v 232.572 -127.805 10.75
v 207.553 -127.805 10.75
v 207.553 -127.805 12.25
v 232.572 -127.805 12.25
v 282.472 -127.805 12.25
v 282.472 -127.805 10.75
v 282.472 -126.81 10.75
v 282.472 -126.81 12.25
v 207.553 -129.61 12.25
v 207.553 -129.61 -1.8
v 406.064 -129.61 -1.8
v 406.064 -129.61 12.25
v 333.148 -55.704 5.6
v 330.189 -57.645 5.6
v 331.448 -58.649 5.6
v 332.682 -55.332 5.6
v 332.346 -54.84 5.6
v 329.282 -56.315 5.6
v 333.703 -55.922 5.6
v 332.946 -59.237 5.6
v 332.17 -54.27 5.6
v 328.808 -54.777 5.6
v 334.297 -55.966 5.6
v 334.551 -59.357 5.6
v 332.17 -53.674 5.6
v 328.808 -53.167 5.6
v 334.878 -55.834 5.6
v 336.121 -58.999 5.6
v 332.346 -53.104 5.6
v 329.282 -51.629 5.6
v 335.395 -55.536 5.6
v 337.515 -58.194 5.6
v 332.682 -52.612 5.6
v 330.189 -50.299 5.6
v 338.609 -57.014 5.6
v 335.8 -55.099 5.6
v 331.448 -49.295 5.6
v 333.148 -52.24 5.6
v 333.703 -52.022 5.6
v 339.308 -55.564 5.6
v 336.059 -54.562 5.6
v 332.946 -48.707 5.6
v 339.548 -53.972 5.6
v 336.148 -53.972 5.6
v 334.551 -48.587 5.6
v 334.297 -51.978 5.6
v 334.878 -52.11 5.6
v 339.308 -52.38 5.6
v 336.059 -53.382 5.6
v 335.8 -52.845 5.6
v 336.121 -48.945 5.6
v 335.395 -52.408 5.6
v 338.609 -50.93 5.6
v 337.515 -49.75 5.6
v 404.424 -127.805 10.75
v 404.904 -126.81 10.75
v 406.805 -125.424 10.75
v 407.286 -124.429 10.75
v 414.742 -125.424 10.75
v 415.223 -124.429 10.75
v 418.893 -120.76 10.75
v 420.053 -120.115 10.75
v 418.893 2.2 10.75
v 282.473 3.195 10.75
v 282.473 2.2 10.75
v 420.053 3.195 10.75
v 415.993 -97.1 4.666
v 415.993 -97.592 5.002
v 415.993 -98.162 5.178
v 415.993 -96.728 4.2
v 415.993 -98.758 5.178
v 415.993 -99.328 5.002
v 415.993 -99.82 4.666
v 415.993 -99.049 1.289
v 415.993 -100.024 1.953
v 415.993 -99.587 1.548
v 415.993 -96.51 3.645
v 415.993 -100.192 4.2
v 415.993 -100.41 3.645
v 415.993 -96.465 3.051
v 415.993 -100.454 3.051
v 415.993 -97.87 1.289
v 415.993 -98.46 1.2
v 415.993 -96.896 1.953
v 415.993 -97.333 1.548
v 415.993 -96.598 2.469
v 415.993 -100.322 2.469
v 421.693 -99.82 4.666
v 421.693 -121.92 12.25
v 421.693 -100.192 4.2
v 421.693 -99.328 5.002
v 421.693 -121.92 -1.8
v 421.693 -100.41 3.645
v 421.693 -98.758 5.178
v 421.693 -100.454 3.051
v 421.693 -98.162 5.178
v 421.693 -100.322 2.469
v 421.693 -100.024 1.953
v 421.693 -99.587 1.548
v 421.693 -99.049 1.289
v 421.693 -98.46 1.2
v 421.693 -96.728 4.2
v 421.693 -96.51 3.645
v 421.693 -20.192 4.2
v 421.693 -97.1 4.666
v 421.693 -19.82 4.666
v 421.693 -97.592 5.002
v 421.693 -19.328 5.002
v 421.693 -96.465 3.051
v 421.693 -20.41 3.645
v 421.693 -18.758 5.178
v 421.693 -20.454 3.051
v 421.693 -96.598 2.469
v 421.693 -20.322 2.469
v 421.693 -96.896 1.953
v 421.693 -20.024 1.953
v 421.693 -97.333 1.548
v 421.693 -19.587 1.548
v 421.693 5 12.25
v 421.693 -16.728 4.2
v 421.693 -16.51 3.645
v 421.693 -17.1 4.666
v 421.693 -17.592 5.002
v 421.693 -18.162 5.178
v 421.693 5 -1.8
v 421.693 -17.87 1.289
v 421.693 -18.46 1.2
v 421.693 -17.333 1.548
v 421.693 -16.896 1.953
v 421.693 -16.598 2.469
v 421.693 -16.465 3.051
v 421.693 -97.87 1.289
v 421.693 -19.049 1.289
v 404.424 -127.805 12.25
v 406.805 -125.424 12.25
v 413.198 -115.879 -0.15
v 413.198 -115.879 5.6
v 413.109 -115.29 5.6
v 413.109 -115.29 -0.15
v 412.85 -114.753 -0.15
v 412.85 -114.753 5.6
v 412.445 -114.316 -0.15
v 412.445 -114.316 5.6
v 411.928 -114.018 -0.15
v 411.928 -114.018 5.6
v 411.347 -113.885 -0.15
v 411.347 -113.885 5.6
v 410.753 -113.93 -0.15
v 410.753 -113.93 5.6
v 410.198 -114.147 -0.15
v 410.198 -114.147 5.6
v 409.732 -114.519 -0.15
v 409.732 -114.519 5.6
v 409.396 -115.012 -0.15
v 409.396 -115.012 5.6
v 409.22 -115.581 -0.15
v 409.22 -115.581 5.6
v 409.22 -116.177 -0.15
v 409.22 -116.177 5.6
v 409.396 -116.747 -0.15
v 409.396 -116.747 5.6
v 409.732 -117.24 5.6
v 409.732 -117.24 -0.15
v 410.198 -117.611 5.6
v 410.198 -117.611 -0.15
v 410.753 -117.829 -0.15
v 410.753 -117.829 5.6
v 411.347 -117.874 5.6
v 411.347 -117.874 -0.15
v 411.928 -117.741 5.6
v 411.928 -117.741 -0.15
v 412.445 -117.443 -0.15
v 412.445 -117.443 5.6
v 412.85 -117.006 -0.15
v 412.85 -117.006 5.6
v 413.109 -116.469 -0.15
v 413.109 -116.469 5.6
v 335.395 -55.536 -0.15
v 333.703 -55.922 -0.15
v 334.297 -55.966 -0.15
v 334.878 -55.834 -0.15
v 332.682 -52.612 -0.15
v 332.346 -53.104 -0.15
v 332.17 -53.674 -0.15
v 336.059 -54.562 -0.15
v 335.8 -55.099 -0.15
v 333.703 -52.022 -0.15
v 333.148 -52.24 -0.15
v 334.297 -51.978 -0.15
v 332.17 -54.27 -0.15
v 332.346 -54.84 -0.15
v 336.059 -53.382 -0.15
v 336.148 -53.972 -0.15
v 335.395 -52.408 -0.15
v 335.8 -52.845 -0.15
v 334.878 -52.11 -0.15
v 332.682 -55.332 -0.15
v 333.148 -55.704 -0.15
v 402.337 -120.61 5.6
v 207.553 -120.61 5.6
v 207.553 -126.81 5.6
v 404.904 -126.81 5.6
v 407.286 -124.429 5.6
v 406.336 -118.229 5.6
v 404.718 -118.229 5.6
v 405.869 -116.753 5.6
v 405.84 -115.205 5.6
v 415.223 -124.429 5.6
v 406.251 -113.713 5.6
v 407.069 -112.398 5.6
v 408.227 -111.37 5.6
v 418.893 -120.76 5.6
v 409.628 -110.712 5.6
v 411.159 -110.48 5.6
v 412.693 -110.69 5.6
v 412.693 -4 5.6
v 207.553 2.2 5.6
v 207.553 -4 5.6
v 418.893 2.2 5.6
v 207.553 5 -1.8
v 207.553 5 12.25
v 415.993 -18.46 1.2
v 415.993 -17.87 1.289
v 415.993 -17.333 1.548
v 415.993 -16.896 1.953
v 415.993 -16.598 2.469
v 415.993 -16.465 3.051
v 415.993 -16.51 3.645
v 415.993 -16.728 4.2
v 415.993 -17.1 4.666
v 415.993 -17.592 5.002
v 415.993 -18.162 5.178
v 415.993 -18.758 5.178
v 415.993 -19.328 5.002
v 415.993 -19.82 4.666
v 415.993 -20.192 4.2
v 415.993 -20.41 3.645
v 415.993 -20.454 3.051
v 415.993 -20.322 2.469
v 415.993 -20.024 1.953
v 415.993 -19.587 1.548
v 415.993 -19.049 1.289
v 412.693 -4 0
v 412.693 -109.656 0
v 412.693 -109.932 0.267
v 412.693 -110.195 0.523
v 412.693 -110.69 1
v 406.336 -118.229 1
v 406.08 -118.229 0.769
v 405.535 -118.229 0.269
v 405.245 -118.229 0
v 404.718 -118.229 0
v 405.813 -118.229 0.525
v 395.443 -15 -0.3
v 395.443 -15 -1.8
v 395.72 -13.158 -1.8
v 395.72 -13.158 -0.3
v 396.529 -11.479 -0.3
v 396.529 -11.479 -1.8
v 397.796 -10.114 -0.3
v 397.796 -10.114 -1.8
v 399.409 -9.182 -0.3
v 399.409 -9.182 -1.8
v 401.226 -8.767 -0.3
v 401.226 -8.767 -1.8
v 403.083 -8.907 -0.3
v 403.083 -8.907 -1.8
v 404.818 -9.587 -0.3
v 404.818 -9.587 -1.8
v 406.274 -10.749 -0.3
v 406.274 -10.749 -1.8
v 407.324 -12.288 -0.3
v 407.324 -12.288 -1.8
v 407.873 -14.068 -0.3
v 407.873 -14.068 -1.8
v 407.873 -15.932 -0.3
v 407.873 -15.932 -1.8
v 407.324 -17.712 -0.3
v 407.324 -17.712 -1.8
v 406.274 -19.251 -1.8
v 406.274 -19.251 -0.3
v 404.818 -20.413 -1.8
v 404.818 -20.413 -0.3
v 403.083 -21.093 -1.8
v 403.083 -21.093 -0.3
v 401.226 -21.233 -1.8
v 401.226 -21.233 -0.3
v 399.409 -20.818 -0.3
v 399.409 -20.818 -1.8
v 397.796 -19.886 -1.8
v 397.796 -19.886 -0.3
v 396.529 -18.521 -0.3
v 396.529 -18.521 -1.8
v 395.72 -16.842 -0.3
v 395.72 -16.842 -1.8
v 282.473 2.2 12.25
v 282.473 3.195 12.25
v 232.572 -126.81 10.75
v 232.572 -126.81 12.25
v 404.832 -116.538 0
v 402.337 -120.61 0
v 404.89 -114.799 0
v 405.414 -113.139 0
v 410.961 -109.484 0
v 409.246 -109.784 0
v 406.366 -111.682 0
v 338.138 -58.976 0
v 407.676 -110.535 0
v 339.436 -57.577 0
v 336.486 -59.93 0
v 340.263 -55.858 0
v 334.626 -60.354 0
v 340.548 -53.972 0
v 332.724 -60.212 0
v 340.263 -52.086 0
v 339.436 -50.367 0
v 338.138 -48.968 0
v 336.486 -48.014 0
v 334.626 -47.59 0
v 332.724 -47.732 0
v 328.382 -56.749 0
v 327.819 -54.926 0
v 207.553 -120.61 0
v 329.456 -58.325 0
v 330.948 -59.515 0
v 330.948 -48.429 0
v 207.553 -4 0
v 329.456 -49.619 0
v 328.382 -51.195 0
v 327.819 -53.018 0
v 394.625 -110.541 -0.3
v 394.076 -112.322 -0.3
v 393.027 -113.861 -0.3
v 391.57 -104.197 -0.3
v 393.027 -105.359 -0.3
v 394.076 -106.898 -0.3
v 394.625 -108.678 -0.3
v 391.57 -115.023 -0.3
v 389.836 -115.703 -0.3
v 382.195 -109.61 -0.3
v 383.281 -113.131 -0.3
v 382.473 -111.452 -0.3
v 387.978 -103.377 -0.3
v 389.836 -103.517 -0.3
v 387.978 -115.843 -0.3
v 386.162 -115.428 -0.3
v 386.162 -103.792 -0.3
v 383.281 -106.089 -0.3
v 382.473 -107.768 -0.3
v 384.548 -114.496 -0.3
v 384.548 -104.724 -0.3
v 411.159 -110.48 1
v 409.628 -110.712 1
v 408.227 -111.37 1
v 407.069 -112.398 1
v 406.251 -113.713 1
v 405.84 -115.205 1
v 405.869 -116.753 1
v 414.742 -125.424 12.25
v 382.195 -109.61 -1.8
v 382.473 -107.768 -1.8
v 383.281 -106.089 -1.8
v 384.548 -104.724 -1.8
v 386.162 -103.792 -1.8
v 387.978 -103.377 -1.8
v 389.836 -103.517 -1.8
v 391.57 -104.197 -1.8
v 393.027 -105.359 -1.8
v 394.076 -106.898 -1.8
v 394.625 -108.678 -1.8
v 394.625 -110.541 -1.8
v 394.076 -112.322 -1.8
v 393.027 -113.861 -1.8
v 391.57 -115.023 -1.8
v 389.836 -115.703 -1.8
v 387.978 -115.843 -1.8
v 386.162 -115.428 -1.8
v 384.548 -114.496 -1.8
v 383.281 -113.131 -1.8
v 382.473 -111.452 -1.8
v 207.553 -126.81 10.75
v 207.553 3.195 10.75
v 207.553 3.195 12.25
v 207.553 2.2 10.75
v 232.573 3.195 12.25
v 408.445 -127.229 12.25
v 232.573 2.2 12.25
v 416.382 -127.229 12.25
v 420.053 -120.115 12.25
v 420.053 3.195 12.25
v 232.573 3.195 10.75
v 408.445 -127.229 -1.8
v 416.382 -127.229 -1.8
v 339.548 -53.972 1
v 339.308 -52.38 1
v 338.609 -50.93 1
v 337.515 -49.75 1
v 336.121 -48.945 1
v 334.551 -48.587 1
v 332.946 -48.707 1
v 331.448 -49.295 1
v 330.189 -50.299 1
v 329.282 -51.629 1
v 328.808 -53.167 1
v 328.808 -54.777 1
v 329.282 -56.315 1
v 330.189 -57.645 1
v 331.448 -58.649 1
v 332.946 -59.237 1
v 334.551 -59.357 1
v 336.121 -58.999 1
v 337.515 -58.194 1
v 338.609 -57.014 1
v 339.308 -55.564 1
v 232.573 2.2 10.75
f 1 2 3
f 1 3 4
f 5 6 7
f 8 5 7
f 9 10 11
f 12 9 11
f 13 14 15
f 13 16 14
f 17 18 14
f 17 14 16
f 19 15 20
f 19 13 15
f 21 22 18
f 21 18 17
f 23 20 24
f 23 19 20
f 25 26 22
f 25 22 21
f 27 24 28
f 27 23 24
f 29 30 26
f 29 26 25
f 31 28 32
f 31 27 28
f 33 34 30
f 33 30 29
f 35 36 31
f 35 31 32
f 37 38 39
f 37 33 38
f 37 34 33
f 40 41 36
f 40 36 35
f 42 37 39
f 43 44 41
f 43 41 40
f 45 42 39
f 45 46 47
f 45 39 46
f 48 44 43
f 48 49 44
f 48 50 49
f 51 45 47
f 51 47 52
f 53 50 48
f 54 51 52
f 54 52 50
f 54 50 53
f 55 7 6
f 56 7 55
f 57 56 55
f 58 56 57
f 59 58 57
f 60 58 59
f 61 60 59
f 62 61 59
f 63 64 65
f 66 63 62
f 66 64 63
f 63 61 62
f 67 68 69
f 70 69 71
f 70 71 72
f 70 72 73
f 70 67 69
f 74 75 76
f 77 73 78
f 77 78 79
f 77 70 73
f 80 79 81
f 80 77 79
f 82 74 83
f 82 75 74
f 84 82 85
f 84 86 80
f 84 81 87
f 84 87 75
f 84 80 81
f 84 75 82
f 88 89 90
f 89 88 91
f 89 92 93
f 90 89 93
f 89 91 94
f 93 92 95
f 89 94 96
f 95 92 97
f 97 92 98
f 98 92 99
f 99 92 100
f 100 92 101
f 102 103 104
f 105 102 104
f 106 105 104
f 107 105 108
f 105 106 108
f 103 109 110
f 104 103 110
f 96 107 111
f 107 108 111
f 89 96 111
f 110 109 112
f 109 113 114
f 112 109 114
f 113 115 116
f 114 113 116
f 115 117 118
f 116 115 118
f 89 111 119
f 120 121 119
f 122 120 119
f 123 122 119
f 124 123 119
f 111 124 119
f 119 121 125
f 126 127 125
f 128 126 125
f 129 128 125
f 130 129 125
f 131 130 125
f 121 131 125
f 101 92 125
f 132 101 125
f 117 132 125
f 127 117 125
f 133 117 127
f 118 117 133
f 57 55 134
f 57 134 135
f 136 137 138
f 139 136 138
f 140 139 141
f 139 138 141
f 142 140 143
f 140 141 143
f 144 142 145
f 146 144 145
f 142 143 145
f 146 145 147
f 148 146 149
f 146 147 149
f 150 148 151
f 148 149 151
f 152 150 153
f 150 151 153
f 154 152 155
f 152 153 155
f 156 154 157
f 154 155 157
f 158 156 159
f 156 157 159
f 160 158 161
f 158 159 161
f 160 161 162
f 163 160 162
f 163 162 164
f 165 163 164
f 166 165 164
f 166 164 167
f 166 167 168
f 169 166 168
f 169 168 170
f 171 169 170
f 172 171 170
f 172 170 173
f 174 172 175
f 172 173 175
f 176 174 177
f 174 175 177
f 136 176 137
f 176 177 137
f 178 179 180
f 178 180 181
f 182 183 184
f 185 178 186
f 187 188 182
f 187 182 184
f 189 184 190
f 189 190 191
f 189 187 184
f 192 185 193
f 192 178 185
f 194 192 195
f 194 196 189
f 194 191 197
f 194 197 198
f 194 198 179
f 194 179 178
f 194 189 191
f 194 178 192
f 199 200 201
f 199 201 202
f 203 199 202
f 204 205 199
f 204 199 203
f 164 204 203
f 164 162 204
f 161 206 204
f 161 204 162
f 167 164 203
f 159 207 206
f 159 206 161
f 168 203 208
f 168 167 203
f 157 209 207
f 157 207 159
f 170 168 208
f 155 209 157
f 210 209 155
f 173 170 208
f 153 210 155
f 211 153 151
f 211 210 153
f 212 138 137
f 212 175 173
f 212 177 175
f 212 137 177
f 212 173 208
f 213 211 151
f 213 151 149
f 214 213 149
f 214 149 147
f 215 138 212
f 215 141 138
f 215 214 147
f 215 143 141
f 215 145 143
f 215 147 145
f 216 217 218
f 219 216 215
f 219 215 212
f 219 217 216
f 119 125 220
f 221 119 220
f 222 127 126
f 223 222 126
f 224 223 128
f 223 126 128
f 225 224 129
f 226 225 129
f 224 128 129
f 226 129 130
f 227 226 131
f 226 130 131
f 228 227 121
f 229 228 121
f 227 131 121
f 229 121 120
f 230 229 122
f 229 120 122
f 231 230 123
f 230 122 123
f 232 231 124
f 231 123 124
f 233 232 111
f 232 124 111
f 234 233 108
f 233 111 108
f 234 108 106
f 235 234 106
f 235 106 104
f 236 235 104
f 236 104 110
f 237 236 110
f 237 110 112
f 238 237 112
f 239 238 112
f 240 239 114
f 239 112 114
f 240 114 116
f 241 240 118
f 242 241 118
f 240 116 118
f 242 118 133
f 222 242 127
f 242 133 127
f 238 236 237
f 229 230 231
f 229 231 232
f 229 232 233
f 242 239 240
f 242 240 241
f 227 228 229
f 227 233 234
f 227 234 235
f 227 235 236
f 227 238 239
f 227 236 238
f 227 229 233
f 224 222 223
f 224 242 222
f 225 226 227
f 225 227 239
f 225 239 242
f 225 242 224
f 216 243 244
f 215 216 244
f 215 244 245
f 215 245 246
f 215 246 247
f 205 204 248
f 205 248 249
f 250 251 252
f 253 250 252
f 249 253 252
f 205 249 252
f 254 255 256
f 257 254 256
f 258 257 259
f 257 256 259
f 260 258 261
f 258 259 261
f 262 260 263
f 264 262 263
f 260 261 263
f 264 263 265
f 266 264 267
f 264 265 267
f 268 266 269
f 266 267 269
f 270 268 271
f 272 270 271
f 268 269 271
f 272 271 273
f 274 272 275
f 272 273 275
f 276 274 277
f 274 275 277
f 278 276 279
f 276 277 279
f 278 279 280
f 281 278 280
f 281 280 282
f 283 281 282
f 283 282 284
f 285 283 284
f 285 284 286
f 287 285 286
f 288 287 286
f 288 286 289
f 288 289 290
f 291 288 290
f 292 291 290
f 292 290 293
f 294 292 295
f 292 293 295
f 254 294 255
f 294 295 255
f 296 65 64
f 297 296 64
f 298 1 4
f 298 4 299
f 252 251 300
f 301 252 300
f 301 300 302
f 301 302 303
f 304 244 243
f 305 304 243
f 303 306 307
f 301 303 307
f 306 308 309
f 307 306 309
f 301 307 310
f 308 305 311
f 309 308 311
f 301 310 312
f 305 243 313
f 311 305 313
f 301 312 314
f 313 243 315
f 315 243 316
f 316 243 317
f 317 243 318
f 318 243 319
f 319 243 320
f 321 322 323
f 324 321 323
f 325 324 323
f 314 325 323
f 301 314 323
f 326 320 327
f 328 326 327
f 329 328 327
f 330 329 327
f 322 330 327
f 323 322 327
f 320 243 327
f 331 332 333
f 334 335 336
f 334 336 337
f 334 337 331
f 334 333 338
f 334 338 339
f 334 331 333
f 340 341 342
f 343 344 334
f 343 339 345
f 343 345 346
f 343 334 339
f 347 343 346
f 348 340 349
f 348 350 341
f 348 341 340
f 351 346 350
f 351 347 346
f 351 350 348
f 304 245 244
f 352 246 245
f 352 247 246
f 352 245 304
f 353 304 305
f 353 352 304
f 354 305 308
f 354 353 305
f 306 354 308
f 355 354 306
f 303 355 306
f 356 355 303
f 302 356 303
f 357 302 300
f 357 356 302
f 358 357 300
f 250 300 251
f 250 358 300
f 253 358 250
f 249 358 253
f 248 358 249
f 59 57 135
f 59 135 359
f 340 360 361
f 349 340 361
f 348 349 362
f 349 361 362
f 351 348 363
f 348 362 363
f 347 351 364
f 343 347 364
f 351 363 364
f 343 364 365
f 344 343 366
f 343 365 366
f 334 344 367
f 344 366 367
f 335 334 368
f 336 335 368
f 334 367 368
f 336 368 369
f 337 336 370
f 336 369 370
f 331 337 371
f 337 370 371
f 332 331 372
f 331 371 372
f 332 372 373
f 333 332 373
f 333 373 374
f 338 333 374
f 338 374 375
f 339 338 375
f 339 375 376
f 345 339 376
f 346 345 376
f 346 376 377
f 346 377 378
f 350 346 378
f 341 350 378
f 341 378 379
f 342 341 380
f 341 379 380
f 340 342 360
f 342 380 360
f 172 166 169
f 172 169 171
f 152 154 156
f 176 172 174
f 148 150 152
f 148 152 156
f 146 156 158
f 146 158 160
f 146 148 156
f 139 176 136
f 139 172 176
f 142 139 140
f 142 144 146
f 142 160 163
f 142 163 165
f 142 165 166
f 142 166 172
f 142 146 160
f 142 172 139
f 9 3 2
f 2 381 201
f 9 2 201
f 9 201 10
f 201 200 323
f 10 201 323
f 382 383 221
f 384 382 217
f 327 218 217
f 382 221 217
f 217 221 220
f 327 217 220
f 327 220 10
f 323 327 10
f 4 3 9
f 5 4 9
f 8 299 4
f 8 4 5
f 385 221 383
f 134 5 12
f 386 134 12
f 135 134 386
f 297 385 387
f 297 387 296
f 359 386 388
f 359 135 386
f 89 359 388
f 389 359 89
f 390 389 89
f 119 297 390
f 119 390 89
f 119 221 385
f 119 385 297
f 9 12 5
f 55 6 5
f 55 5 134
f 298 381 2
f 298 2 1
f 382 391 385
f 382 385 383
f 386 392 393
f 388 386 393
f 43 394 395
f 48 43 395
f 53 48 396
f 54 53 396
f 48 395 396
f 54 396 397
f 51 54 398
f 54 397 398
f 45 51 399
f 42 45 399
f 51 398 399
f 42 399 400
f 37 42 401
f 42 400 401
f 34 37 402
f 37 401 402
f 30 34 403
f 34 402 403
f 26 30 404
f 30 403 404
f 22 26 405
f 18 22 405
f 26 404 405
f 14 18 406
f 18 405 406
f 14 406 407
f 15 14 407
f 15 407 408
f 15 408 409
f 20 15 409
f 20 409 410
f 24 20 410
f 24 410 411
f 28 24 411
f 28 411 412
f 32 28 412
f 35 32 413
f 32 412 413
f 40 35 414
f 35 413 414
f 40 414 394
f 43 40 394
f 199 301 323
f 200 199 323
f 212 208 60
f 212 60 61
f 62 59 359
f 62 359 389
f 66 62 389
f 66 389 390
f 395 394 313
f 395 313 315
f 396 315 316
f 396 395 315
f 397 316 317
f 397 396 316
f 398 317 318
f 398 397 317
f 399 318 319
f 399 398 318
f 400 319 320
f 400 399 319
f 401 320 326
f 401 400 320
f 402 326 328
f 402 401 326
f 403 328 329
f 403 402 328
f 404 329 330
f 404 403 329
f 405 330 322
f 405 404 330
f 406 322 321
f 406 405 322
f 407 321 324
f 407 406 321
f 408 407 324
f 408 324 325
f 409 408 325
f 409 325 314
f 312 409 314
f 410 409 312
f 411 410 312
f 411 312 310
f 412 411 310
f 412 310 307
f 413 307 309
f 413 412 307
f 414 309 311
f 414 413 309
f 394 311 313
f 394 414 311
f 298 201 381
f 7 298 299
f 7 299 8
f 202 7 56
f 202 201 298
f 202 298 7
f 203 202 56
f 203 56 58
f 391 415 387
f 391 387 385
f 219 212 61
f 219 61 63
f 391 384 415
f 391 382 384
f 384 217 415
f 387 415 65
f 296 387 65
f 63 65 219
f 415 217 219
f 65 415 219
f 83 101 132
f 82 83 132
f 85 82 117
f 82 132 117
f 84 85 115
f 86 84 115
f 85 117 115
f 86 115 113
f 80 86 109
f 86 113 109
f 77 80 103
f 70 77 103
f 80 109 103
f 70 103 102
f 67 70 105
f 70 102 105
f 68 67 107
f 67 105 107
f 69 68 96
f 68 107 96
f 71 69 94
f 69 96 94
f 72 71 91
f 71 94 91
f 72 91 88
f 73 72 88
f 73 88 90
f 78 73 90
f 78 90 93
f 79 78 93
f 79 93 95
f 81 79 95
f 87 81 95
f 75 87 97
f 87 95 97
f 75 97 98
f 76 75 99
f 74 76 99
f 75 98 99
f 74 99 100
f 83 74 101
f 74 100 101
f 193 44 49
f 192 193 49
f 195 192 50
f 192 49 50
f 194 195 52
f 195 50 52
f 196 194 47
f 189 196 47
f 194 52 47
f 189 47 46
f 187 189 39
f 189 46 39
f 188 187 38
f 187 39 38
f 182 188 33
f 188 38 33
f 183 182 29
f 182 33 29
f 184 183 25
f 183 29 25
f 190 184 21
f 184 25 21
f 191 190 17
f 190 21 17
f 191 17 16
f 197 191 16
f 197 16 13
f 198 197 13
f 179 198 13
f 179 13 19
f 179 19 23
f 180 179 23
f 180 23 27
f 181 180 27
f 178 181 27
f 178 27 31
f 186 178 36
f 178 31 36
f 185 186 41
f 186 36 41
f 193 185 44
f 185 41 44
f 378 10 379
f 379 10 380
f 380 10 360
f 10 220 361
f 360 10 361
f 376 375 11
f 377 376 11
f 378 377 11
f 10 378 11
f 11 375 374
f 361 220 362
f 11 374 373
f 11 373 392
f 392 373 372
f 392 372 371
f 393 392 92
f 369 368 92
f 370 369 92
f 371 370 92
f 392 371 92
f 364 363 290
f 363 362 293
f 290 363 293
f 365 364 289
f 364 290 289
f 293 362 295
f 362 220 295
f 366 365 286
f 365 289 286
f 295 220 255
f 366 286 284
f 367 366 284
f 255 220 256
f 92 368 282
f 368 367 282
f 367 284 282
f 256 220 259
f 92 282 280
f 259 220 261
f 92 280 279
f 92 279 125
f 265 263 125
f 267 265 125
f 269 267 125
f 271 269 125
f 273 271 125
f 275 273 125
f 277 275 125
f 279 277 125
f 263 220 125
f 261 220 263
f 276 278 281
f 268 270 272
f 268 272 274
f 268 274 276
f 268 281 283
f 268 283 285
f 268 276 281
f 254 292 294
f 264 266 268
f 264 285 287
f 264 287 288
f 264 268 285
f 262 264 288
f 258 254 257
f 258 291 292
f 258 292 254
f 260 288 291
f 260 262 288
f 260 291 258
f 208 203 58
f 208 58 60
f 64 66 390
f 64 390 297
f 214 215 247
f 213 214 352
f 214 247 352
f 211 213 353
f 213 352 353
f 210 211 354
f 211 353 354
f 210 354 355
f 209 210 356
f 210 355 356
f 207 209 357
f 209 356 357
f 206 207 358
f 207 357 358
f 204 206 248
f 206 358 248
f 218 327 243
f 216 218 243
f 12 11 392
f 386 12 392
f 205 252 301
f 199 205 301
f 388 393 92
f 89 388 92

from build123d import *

# Parameters (mm, degrees)
P_IDAT_VYSUNUT_M1_DEPTH  = 5.6
SKO_EPINA1_T             = 1.8
P_IDAT_VYSUNUT_M3_DEPTH  = 5.15
P_IDAT_VYSUNUT_M4_DEPTH  = 7.4
P_IDAT_VYSUNUT_M5_DEPTH  = 1.5
SKICA14_W                = 49.9
SKICA14_H                = 0.995009232
P_IDAT_VYSUNUT_M6_DEPTH  = 1.5
SKICA15_R                = 5.4
SKICA15_W                = 3
SKICA15_H                = 9
P_IDAT_VYSUNUT_M7_DEPTH  = 5.6
SKICA16_R                = 2
ODEBRAT_VYSUNUT_M1_DEPTH = 5.75
ZKOSEN_1_SIZE            = 1
SKICA17_W                = 24
SKICA17_H                = 13.4
ODEBRAT_VYSUNUT_M2_DEPTH = 1.6
ODEBRAT_VYSUNUT_M3_REACH = 442.031
SKICA23_R                = 2
ODEBRAT_VYSUNUT_M4_DEPTH = 5.7
SKICA24_R                = 2
ODEBRAT_VYSUNUT_M5_DEPTH = 5.7
SKICA25_R                = 6.25
ODEBRAT_VYSUNUT_M6_DEPTH = 1.5
SKICA26_W                = 214.14008497
SKICA26_H                = 14.05
ODEBRAT_VYSUNUT_M7_DEPTH = 443.82576223


with BuildPart() as part:
    # Skica3 → Přidat vysunutím1 (new body)
    with BuildSketch(Plane.XY):
        Polygon((2.412545276, -4), (412.692715215, -4), (412.692715215, -118.191389918), (412.654731358, -118.229366948), (404.717731358, -118.229366948), (402.336688893, -120.609981536), (12.768122748, -120.609981536), (10.387229089, -118.22921813), (2.450229089, -118.22921813), (2.412545276, -118.191536378), align=None)
    extrude(amount=P_IDAT_VYSUNUT_M1_DEPTH)

    # Skořepina1
    sko_epina1_openings = [part.faces().sort_by_distance(p)[0] for p in [
        (207.552632266, -62.25279763, 5.6),
    ]]
    offset(amount=SKO_EPINA1_T, openings=sko_epina1_openings, kind=Kind.INTERSECTION)



with BuildPart() as body_2:
    # Skica7 → Přidat vysunutím3 (new body)
    with BuildSketch(Plane.XY.offset(5.6)):
        Polygon((-6.587454724, 5), (-6.587454724, -121.919602656), (-1.277548758, -127.22921813), (6.659451242, -127.22921813), (9.040344901, -129.609981536), (406.06413722, -129.609981536), (408.445179685, -127.229366948), (416.382179685, -127.229366948), (421.692715215, -121.919785731), (421.692715215, 5), align=None)
        Polygon((-3.787454724, 2.2), (-3.787454724, -120.759759814), (-0.11779565, -124.42921813), (7.81920435, -124.42921813), (10.200098009, -126.809981536), (404.904486629, -126.809981536), (407.285529094, -124.429366948), (415.222529094, -124.429366948), (418.892715215, -120.759840367), (418.892715215, 2.2), align=None, mode=Mode.SUBTRACT)
    extrude(amount=P_IDAT_VYSUNUT_M3_DEPTH)


with BuildPart() as part_1:
    add(part.part)

    add(body_2.part)  # Přidat vysunutím4 merges body 2
    # Skica8 → Přidat vysunutím4 (add)
    with BuildSketch(Plane(origin=(0, 0, 5.6), x_dir=(-1, 0, 0), z_dir=(0, 0, -1))):
        Polygon((-421.692715215, 5), (6.587454724, 5), (6.587454724, -121.919602656), (1.277548758, -127.22921813), (-6.659451242, -127.22921813), (-9.040344901, -129.609981536), (-406.06413722, -129.609981536), (-408.445179685, -127.229366948), (-416.382179685, -127.229366948), (-421.692715215, -121.919785731), align=None)
        Polygon((-0.612545276, -2.2), (-0.612545276, -118.937149634), (-1.70467352, -120.02921813), (-9.64167352, -120.02921813), (-12.022567179, -122.409981536), (-403.082178558, -122.409981536), (-405.463221024, -120.029366948), (-413.400221024, -120.029366948), (-414.492715215, -118.93706908), (-414.492715215, -2.2), align=None, mode=Mode.SUBTRACT)
    extrude(amount=P_IDAT_VYSUNUT_M4_DEPTH)

    # Skica11 → Přidat vysunutím5 (add)
    with BuildSketch(Plane.XY.offset(10.75)):
        Polygon((421.692715215, 5), (-6.587454724, 5), (-6.587454724, -121.919602656), (-1.277548758, -127.22921813), (6.659451242, -127.22921813), (9.040344901, -129.609981536), (406.06413722, -129.609981536), (408.445179685, -127.229366948), (416.382179685, -127.229366948), (421.692715215, -121.919785731), align=None)
        Polygon((420.052630246, 3.195009232), (-4.947369754, 3.195009232), (-4.947369754, -120.114611888), (-0.239981646, -124.821742467), (7.697018354, -124.821742467), (10.68042987, -127.804990768), (404.42405225, -127.804990768), (406.805094715, -125.424376181), (414.742094715, -125.424376181), (420.052630246, -120.114794964), align=None, mode=Mode.SUBTRACT)
    extrude(amount=P_IDAT_VYSUNUT_M5_DEPTH)

    # Skica14 → Přidat vysunutím6 (add)
    with BuildSketch(Plane.XY.offset(10.75)):
        with Locations((157.582630246, 2.697504616)):
            Rectangle(SKICA14_W, SKICA14_H)
        with Locations((257.522630246, 2.697504616)):
            Rectangle(SKICA14_W, SKICA14_H)
        with Locations((257.52224106, -127.307486152)):
            Rectangle(SKICA14_W, SKICA14_H)
        with Locations((157.58224106, -127.307486152)):
            Rectangle(SKICA14_W, SKICA14_H)
    extrude(amount=P_IDAT_VYSUNUT_M6_DEPTH)

    # Skica15 → Přidat vysunutím7 (add)
    with BuildSketch(Plane.XY):
        with Locations((3.968545276, -115.95421813)):
            Circle(SKICA15_R)
        with Locations((33.491545276, -69.050981536)):
            Circle(SKICA15_R)
        with Locations((411.197715215, -115.879366948)):
            Circle(SKICA15_R)
        with Locations((334.147715215, -53.972)):
            Circle(SKICA15_R)
        with Locations((36.401545276, 0)):
            Rectangle(SKICA15_W, SKICA15_H)
    extrude(amount=P_IDAT_VYSUNUT_M7_DEPTH)

    # Skica16 → Odebrat vysunutím1 (cut)
    with BuildSketch(Plane.XY.offset(5.6)):
        with Locations((3.968545276, -115.95421813)):
            Circle(SKICA16_R)
        with Locations((33.491545276, -69.050981536)):
            Circle(SKICA16_R)
        with Locations((334.147715215, -53.972)):
            Circle(SKICA16_R)
        with Locations((411.197715215, -115.879366948)):
            Circle(SKICA16_R)
    extrude(amount=-ODEBRAT_VYSUNUT_M1_DEPTH, mode=Mode.SUBTRACT)

    # Zkosení1
    zkosen_1_edges = [part_1.edges().sort_by_distance(p)[0] for p in [
        (8.049207709, -112.417525591, 0),
        (28.091545276, -69.050981536, 0),
        (407.069426922, -112.398384936, 0),
        (328.747715215, -53.972, 0),
    ]]
    chamfer(zkosen_1_edges, length=ZKOSEN_1_SIZE)

    # Skica17 → Odebrat vysunutím2 (cut)
    with BuildSketch(Plane.XY.offset(5.6)):
        with Locations((36.401545276, -4.5)):
            Rectangle(SKICA17_W, SKICA17_H)
    extrude(amount=-ODEBRAT_VYSUNUT_M2_DEPTH, mode=Mode.SUBTRACT)

    # Odebrat vysunutím3: up to this face of the body (flat: up to its plane)
    odebrat_vysunut_m3_end = Plane(part_1.part.faces().sort_by_distance((207.552630246, 5, 5.225))[0])
    # Skica18 → Odebrat vysunutím3 (cut, up to the picked face)
    with BuildSketch(Plane.XZ.offset(4.5), mode=Mode.PRIVATE) as odebrat_vysunut_m3_sk1:
        with BuildLine():
            Line((33.651545276, 7.5), (39.151545276, 7.5))
            ThreePointArc((39.151545276, 7.5), (42.651545276, 4), (39.151545276, 0.5))
            Line((39.151545276, 0.5), (33.651545276, 0.5))
            ThreePointArc((33.651545276, 0.5), (30.151545276, 4), (33.651545276, 7.5))
        make_face()
    odebrat_vysunut_m3_tool1 = split(extrude(odebrat_vysunut_m3_sk1.sketch, amount=-ODEBRAT_VYSUNUT_M3_REACH, mode=Mode.PRIVATE), bisect_by=odebrat_vysunut_m3_end, keep=Keep.BOTH, mode=Mode.PRIVATE)
    add(odebrat_vysunut_m3_tool1.solids().sort_by(Axis((36.401545, -4.5, 4), (0, 1, 0)))[0], mode=Mode.SUBTRACT)

    # Skica23 → Odebrat vysunutím4 (cut)
    with BuildSketch(Plane.ZY.offset(6.587454724)):
        with Locations((3.2, -18.459801328)):
            Circle(SKICA23_R)
        with Locations((3.2, -98.459801328)):
            Circle(SKICA23_R)
    extrude(amount=-ODEBRAT_VYSUNUT_M4_DEPTH, mode=Mode.SUBTRACT)

    # Skica24 → Odebrat vysunutím5 (cut)
    with BuildSketch(Plane(origin=(421.692715215, 0, 0), x_dir=(0, 0, -1), z_dir=(1, 0, 0))):
        with Locations((-3.2, -18.459892866)):
            Circle(SKICA24_R)
        with Locations((-3.2, -98.459892866)):
            Circle(SKICA24_R)
    extrude(amount=-ODEBRAT_VYSUNUT_M5_DEPTH, mode=Mode.SUBTRACT)

    # Skica25 → Odebrat vysunutím6 (cut)
    with BuildSketch(Plane(origin=(0, 0, -1.8), x_dir=(-1, 0, 0), z_dir=(0, 0, -1))):
        with Locations((-401.692715215, -15)):
            Circle(SKICA25_R)
        with Locations((-13.412545276, -15)):
            Circle(SKICA25_R)
        with Locations((-388.445179685, -109.609981536)):
            Circle(SKICA25_R)
        with Locations((-26.659451242, -109.609981536)):
            Circle(SKICA25_R)
    extrude(amount=-ODEBRAT_VYSUNUT_M6_DEPTH, mode=Mode.SUBTRACT)

    # Skica26 → Odebrat vysunutím7 (cut, through all)
    with BuildSketch(Plane(origin=(0, 5, 0), x_dir=(1, 0, 0), z_dir=(0, 1, 0))):
        with Locations((100.482587761, -5.225)):
            Rectangle(SKICA26_W, SKICA26_H)
    extrude(amount=-ODEBRAT_VYSUNUT_M7_DEPTH, mode=Mode.SUBTRACT)


solid = part_1.part
